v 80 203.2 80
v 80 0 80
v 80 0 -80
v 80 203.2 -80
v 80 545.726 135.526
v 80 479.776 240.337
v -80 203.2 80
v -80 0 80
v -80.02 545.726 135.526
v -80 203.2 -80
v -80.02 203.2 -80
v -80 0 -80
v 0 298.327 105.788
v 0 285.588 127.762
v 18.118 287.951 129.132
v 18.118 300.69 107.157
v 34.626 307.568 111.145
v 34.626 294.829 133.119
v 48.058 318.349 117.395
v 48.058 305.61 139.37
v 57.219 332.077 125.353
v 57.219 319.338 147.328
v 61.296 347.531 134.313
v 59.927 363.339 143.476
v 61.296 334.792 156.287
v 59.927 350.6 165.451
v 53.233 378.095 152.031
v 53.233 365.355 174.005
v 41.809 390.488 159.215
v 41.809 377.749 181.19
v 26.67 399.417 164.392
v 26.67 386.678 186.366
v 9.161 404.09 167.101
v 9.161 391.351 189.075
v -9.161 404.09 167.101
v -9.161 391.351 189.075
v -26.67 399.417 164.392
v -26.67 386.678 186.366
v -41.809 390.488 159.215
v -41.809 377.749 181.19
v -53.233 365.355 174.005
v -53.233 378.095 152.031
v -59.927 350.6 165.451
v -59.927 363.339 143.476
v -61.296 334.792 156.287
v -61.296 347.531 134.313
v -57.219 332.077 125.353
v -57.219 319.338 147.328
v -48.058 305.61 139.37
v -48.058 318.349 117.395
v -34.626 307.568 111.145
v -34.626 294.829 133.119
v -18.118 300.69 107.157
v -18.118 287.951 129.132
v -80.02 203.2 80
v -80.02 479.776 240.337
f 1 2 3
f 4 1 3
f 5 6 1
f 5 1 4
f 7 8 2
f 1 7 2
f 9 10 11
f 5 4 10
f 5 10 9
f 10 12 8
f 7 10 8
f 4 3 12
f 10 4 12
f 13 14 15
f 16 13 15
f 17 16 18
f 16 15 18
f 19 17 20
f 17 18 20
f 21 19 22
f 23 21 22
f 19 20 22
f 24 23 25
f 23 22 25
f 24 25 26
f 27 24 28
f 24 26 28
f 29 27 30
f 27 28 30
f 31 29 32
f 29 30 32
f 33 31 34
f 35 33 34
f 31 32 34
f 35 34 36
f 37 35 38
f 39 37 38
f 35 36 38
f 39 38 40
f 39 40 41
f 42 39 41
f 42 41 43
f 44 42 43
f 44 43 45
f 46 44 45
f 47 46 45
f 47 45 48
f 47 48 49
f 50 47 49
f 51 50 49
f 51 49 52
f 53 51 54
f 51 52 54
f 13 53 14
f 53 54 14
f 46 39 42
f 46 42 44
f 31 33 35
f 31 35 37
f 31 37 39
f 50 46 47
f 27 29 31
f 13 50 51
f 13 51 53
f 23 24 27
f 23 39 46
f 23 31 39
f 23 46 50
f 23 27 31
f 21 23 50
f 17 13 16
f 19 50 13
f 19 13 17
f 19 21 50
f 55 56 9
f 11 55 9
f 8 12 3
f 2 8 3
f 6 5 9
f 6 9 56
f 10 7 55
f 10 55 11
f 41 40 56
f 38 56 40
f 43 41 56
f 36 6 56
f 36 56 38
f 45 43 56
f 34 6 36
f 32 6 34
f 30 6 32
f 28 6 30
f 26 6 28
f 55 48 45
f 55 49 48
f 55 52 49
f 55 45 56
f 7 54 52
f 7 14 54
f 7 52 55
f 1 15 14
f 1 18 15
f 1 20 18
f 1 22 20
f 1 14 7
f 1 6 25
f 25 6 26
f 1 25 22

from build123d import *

# Parameters (mm, degrees)
BOSS_EXTRUDE1_DEPTH = 203.2
BOSS_EXTRUDE2_DEPTH = 160.02
SKETCH5_R           = 61.468
CUT_EXTRUDE1_DEPTH  = 25.4


with BuildPart() as part:
    # Sketch1 → Boss-Extrude1 (new body)
    with BuildSketch(Plane(origin=(0, 0, 0), x_dir=(1, 0, 0), z_dir=(0, 1, 0))):
        Polygon((0, 80), (-80, 80), (-80, 0), (-80, -80), (0, -80), (80, -80), (80, 0), (80, 80), align=None)
    extrude(amount=BOSS_EXTRUDE1_DEPTH)

    # Sketch4 → Boss-Extrude2 (add)
    with BuildSketch(Plane(origin=(80, 0, 0), x_dir=(0, 0, -1), z_dir=(1, 0, 0))):
        Polygon((80, 203.2), (-135.526146906, 545.726146906), (-240.337405258, 479.776242441), (-80, 203.2), align=None)
    extrude(amount=-BOSS_EXTRUDE2_DEPTH)

    # Sketch5 → Cut-Extrude1 (cut)
    with BuildSketch(Plane(origin=(0, 16.401175936, -28.291437078), x_dir=(1, 0, 0), z_dir=(0, -0.5015382826017037, 0.8651354524494611))):
        with Locations(Location((0, 372.618160976, 0), (0, 0, 270))):
            Circle(SKETCH5_R)
    extrude(amount=-CUT_EXTRUDE1_DEPTH, mode=Mode.SUBTRACT)


solid = part.part
